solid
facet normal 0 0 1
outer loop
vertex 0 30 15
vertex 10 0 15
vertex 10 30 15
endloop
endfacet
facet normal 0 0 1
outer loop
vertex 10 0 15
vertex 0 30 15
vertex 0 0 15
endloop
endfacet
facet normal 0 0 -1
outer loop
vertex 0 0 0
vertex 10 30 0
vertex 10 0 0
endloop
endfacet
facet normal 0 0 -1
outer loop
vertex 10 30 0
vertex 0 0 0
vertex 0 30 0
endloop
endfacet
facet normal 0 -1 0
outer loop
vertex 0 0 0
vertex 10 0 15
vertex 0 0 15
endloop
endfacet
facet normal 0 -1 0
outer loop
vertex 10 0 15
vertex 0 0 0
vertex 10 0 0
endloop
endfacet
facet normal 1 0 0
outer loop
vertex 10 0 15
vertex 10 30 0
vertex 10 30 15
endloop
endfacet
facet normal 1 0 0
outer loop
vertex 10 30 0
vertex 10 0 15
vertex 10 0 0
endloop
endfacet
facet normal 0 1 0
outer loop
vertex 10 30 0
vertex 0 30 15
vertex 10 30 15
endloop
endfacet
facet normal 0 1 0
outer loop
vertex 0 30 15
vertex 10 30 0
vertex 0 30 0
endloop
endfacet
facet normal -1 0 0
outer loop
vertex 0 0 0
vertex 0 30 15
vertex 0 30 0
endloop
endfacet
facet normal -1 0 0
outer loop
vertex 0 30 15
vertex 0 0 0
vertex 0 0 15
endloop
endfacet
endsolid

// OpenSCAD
// Generated by generate_scads.py
cube(size=[10,30,15], center=false);
